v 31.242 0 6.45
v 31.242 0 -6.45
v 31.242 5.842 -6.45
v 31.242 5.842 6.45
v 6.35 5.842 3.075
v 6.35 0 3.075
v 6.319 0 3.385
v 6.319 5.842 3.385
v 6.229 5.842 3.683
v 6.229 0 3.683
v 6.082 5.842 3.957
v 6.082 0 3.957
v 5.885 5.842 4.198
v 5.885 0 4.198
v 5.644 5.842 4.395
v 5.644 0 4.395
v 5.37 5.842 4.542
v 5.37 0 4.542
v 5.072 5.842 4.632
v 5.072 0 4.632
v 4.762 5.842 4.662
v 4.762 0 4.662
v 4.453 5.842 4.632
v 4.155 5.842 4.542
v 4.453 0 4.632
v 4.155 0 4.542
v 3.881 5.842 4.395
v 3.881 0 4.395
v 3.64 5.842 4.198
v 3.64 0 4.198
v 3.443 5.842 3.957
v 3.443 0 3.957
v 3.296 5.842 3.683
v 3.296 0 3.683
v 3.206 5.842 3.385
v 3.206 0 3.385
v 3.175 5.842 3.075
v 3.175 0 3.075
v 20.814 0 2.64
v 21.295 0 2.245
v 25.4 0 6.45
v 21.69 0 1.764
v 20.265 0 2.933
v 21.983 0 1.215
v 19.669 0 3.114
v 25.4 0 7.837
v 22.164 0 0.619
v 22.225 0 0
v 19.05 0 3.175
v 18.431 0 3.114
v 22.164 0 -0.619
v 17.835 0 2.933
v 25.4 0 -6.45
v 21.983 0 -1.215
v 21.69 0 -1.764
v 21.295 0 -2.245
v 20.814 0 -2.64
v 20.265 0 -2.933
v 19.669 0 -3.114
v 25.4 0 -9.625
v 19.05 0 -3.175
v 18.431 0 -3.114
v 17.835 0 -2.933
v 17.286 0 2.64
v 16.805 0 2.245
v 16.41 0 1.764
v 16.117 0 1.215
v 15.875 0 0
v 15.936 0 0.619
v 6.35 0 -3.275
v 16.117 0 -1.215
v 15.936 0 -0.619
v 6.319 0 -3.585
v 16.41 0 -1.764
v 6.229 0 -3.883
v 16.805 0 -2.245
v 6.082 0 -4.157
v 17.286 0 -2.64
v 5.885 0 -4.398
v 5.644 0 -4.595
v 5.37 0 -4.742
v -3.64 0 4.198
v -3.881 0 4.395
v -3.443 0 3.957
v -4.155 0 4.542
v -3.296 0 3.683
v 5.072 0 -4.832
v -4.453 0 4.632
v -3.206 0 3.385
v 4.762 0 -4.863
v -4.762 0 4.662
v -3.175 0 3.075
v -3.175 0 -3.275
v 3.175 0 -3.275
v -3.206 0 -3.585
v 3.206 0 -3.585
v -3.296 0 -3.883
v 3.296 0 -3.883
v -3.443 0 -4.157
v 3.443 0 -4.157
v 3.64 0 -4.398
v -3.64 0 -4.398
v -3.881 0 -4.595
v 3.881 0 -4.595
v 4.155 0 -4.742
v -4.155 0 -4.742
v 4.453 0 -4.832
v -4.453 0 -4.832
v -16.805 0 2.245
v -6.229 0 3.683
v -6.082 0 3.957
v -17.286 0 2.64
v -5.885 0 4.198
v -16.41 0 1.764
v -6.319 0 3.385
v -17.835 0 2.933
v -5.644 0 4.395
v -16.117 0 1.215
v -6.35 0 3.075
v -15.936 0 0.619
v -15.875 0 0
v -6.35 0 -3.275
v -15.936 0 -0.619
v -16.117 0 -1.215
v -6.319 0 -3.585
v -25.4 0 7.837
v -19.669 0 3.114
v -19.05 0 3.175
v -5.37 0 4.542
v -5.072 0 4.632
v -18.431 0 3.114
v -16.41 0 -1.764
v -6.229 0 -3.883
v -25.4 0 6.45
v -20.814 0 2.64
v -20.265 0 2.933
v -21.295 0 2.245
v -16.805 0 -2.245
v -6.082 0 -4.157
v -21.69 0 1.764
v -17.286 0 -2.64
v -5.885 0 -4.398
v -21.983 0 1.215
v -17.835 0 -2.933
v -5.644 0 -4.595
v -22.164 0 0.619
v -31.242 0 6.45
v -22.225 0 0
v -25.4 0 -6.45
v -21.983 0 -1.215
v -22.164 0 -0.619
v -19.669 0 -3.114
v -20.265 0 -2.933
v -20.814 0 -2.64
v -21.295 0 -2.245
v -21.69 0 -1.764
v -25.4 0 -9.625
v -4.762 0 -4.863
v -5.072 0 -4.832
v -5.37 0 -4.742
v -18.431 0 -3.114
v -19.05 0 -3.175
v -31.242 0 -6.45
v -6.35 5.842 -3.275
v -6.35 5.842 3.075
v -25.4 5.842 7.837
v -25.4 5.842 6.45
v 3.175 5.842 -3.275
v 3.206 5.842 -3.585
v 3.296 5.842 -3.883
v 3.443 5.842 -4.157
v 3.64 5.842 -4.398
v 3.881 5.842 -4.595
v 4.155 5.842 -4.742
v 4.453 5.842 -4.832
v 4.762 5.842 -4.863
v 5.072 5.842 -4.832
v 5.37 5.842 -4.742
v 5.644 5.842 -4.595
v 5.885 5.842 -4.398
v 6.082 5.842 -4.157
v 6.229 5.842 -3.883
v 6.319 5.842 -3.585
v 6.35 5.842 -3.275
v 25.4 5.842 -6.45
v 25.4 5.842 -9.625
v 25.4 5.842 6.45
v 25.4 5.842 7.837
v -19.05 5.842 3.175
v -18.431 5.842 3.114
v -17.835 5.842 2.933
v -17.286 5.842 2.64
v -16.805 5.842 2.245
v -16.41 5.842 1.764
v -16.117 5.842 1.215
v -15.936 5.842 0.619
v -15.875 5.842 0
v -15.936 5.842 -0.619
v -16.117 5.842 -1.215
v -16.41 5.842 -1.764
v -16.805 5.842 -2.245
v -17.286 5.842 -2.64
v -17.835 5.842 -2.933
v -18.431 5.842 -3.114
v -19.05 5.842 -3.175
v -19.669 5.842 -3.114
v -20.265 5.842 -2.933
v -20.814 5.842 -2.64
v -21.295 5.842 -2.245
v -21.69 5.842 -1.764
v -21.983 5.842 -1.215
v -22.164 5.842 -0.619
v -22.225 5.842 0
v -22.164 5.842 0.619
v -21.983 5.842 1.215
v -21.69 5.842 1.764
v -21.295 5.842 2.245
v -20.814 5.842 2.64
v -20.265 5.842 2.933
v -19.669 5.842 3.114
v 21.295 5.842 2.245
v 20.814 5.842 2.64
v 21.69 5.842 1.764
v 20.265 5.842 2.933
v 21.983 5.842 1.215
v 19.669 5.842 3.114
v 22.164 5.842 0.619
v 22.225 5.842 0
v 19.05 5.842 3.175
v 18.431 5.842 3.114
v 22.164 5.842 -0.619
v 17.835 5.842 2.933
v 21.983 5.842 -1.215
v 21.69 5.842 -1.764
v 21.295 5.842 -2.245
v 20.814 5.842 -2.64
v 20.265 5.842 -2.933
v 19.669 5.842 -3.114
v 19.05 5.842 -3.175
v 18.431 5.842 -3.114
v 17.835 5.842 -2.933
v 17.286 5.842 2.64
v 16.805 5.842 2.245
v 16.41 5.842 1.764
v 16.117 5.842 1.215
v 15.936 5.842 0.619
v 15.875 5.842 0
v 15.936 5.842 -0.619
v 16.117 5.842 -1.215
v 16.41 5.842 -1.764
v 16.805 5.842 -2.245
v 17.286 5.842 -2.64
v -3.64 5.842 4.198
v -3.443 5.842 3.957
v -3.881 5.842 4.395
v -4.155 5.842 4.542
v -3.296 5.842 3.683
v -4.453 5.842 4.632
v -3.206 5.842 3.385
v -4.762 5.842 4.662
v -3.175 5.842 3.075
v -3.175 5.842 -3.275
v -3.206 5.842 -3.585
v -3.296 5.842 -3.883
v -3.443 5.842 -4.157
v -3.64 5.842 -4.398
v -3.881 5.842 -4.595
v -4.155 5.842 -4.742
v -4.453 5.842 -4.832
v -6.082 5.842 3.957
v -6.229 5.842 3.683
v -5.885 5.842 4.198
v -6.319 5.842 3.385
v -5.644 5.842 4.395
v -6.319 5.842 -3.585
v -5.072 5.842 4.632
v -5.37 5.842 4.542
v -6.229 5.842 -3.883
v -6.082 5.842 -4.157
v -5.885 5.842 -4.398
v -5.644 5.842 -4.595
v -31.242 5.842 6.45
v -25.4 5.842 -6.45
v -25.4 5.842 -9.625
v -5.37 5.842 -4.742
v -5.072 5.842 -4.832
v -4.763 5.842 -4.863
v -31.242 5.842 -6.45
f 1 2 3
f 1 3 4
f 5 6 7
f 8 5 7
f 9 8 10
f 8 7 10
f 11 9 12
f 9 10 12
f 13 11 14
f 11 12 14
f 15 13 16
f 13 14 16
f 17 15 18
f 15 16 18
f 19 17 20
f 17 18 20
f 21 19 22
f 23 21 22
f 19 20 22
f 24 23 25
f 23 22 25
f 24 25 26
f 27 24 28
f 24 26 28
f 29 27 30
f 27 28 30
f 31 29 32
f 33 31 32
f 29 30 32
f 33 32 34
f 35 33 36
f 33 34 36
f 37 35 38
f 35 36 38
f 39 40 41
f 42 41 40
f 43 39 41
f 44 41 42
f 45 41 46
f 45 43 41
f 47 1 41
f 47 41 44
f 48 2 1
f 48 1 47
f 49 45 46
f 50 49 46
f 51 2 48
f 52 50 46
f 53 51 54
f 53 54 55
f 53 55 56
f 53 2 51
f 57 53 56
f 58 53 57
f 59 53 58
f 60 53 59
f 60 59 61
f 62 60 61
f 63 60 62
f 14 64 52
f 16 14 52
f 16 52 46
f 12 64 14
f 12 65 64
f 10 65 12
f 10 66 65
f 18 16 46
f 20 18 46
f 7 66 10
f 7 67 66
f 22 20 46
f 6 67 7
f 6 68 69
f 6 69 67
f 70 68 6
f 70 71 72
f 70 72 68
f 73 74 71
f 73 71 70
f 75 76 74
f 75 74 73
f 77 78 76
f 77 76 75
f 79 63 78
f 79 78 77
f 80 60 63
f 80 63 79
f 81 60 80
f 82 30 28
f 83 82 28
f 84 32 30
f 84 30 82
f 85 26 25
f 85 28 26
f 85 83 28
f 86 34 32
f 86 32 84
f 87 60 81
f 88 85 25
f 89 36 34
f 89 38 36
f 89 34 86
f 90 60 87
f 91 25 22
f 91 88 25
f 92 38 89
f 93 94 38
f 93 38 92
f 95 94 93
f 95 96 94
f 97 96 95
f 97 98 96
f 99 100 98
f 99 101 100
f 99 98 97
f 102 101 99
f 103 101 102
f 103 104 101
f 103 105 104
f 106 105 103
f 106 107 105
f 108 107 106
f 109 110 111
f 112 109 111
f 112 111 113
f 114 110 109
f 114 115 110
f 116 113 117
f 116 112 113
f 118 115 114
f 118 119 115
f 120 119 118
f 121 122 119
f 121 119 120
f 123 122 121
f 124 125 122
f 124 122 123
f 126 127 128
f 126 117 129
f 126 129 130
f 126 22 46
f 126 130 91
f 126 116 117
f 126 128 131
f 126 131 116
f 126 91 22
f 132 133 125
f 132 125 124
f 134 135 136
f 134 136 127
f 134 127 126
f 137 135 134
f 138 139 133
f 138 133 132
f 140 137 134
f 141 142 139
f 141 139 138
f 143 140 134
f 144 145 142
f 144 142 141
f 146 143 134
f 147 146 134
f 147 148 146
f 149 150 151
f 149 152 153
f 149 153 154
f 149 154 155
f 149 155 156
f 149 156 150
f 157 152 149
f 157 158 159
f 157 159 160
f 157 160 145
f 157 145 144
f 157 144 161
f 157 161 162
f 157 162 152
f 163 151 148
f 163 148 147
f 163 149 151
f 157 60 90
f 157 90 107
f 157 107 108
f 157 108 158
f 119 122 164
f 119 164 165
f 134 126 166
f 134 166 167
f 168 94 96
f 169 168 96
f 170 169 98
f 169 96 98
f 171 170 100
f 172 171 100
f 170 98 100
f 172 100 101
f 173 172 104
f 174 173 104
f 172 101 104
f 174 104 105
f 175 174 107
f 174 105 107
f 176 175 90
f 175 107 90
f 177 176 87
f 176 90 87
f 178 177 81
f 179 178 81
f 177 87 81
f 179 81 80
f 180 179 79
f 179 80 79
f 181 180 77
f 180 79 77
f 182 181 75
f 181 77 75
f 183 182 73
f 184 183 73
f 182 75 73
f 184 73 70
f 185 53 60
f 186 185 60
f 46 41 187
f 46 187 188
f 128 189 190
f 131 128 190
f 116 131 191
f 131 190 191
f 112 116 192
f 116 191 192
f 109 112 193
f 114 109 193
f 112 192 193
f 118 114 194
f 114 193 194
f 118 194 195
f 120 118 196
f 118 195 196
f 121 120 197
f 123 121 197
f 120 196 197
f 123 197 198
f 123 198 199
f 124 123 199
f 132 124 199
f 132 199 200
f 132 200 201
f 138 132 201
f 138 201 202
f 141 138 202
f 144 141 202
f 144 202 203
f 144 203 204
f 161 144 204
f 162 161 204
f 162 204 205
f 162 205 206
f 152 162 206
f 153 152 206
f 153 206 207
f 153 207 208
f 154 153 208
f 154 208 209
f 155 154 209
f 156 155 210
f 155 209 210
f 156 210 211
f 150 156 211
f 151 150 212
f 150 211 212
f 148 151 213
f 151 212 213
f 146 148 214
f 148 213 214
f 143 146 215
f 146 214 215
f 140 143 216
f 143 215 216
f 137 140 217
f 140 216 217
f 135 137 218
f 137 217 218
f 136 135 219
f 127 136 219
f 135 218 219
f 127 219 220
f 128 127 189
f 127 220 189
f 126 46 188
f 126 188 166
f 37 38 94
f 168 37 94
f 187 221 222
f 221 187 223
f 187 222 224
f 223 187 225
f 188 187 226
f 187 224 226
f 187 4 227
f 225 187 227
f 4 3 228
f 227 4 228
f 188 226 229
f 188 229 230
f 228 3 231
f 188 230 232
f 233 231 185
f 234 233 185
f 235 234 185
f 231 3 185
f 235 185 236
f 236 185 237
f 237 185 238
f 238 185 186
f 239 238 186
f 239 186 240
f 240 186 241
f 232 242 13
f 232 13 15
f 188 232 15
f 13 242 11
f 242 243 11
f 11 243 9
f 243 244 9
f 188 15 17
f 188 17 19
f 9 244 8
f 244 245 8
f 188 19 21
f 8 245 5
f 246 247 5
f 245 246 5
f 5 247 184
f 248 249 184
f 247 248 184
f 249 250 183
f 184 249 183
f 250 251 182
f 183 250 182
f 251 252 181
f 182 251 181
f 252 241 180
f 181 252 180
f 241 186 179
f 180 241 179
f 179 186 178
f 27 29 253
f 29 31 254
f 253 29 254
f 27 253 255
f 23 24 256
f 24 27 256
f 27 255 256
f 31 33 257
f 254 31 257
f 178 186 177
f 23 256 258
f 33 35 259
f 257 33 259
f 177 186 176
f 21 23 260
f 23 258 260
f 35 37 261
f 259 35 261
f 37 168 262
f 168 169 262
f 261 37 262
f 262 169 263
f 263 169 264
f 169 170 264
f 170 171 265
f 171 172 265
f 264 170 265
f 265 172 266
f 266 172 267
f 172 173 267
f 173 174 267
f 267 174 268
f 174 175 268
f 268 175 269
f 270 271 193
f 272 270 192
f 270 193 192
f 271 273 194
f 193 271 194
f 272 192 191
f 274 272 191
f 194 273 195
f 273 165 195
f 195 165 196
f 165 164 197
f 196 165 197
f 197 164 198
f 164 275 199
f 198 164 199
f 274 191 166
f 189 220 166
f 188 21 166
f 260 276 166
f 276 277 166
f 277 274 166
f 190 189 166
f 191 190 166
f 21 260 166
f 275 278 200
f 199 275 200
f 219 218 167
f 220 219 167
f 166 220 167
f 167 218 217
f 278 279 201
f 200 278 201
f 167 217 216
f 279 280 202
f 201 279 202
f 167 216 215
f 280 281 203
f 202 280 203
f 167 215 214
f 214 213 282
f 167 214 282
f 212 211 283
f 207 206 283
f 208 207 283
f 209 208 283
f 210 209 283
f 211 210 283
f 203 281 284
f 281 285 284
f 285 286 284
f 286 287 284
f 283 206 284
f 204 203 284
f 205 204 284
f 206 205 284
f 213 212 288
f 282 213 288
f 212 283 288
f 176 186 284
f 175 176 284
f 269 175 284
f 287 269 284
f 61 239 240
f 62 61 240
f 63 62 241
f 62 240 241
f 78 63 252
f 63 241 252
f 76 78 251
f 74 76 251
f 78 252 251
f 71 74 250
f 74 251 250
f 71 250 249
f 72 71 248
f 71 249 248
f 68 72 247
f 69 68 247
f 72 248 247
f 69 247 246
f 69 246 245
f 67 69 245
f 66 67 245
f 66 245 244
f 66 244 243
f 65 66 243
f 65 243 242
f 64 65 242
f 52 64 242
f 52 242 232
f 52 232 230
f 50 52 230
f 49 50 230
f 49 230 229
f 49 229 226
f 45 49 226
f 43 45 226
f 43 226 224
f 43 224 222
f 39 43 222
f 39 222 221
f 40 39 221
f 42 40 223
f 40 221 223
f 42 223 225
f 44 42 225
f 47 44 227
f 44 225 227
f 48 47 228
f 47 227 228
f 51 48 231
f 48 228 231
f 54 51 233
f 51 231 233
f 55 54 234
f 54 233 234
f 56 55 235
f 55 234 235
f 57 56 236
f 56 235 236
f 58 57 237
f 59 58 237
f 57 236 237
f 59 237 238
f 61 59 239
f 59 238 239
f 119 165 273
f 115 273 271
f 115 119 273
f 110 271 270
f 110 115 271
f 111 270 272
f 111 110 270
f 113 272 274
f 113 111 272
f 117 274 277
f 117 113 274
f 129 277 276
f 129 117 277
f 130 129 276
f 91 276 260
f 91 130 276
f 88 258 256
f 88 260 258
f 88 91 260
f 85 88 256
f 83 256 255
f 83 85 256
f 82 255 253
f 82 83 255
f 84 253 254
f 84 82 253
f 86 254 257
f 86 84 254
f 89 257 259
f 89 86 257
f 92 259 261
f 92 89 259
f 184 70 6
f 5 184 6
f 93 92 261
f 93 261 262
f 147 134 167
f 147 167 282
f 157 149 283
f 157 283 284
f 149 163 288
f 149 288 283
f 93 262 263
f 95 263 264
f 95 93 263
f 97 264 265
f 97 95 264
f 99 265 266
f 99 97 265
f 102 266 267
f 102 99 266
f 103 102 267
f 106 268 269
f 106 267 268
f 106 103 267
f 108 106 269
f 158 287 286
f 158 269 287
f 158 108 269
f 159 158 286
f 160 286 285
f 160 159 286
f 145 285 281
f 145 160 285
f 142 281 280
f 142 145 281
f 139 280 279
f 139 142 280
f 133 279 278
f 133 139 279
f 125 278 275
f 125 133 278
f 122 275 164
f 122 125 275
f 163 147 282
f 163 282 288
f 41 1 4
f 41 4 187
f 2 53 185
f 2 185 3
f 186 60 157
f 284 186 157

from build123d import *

# Parameters (mm, degrees)
BOSS_EXTRUDE1_DEPTH = 5.842
SKETCH2_R           = 3.175
CUT_EXTRUDE1_DEPTH  = 33.78403476
CUT_EXTRUDE3_DEPTH  = 33.78403476
SKETCH5_W           = 50.8
SKETCH5_H           = 1.5875
BOSS_EXTRUDE2_DEPTH = 5.842


with BuildPart() as part:
    # Sketch1 → Boss-Extrude1 (new body)
    with BuildSketch(Plane(origin=(0, 0, 0), x_dir=(1, 0, 0), z_dir=(0, 1, 0))):
        Polygon((31.242, -6.450000054), (25.4, -6.450000054), (25.4, -7.837499946), (-25.4, -7.837499946), (-25.4, -6.450000054), (-31.242, -6.450000054), (-31.242, 6.450000054), (-25.4, 6.450000054), (-25.4, 8.037500054), (25.4, 8.037500054), (25.4, 6.450000054), (31.242, 6.450000054), align=None)
    extrude(amount=BOSS_EXTRUDE1_DEPTH)

    # Sketch2 → Cut-Extrude1 (cut, through all)
    with BuildSketch(Plane(origin=(0, 5.842, 0), x_dir=(1, 0, 0), z_dir=(0, 1, 0))):
        with Locations(Location((-19.05, 0, 0), (0, 0, 270))):
            Circle(SKETCH2_R)
        with Locations(Location((19.05, 0, 0), (0, 0, 90))):
            Circle(SKETCH2_R)
    extrude(amount=-CUT_EXTRUDE1_DEPTH, mode=Mode.SUBTRACT)

    # Sketch4 → Cut-Extrude3 (cut, through all)
    with BuildSketch(Plane(origin=(0, 0, 0), x_dir=(-1, 0, 0), z_dir=(0, -1, 0))):
        with BuildLine():
            Line((3.175, -3.074999946), (3.175, 3.275000054))
            ThreePointArc((3.175, 3.275000054), (4.7625, 4.862500054), (6.35, 3.275000054))
            Line((6.35, 3.275000054), (6.35, -3.074999946))
            ThreePointArc((6.35, -3.074999946), (4.7625, -4.662499946), (3.175, -3.074999946))
        make_face()
        with BuildLine():
            Line((-3.175, -3.074999946), (-3.175, 3.275000054))
            ThreePointArc((-3.175, 3.275000054), (-4.7625, 4.862500054), (-6.35, 3.275000054))
            Line((-6.35, 3.275000054), (-6.35, -3.074999946))
            ThreePointArc((-6.35, -3.074999946), (-4.7625, -4.662499946), (-3.175, -3.074999946))
        make_face()
    extrude(amount=-CUT_EXTRUDE3_DEPTH, mode=Mode.SUBTRACT)

    # Sketch5 → Boss-Extrude2 (add)
    with BuildSketch(Plane(origin=(0, 0, 0), x_dir=(-1, 0, 0), z_dir=(0, -1, 0))):
        with Locations((0, 8.831250054)):
            Rectangle(SKETCH5_W, SKETCH5_H)
    extrude(amount=-BOSS_EXTRUDE2_DEPTH)


solid = part.part
